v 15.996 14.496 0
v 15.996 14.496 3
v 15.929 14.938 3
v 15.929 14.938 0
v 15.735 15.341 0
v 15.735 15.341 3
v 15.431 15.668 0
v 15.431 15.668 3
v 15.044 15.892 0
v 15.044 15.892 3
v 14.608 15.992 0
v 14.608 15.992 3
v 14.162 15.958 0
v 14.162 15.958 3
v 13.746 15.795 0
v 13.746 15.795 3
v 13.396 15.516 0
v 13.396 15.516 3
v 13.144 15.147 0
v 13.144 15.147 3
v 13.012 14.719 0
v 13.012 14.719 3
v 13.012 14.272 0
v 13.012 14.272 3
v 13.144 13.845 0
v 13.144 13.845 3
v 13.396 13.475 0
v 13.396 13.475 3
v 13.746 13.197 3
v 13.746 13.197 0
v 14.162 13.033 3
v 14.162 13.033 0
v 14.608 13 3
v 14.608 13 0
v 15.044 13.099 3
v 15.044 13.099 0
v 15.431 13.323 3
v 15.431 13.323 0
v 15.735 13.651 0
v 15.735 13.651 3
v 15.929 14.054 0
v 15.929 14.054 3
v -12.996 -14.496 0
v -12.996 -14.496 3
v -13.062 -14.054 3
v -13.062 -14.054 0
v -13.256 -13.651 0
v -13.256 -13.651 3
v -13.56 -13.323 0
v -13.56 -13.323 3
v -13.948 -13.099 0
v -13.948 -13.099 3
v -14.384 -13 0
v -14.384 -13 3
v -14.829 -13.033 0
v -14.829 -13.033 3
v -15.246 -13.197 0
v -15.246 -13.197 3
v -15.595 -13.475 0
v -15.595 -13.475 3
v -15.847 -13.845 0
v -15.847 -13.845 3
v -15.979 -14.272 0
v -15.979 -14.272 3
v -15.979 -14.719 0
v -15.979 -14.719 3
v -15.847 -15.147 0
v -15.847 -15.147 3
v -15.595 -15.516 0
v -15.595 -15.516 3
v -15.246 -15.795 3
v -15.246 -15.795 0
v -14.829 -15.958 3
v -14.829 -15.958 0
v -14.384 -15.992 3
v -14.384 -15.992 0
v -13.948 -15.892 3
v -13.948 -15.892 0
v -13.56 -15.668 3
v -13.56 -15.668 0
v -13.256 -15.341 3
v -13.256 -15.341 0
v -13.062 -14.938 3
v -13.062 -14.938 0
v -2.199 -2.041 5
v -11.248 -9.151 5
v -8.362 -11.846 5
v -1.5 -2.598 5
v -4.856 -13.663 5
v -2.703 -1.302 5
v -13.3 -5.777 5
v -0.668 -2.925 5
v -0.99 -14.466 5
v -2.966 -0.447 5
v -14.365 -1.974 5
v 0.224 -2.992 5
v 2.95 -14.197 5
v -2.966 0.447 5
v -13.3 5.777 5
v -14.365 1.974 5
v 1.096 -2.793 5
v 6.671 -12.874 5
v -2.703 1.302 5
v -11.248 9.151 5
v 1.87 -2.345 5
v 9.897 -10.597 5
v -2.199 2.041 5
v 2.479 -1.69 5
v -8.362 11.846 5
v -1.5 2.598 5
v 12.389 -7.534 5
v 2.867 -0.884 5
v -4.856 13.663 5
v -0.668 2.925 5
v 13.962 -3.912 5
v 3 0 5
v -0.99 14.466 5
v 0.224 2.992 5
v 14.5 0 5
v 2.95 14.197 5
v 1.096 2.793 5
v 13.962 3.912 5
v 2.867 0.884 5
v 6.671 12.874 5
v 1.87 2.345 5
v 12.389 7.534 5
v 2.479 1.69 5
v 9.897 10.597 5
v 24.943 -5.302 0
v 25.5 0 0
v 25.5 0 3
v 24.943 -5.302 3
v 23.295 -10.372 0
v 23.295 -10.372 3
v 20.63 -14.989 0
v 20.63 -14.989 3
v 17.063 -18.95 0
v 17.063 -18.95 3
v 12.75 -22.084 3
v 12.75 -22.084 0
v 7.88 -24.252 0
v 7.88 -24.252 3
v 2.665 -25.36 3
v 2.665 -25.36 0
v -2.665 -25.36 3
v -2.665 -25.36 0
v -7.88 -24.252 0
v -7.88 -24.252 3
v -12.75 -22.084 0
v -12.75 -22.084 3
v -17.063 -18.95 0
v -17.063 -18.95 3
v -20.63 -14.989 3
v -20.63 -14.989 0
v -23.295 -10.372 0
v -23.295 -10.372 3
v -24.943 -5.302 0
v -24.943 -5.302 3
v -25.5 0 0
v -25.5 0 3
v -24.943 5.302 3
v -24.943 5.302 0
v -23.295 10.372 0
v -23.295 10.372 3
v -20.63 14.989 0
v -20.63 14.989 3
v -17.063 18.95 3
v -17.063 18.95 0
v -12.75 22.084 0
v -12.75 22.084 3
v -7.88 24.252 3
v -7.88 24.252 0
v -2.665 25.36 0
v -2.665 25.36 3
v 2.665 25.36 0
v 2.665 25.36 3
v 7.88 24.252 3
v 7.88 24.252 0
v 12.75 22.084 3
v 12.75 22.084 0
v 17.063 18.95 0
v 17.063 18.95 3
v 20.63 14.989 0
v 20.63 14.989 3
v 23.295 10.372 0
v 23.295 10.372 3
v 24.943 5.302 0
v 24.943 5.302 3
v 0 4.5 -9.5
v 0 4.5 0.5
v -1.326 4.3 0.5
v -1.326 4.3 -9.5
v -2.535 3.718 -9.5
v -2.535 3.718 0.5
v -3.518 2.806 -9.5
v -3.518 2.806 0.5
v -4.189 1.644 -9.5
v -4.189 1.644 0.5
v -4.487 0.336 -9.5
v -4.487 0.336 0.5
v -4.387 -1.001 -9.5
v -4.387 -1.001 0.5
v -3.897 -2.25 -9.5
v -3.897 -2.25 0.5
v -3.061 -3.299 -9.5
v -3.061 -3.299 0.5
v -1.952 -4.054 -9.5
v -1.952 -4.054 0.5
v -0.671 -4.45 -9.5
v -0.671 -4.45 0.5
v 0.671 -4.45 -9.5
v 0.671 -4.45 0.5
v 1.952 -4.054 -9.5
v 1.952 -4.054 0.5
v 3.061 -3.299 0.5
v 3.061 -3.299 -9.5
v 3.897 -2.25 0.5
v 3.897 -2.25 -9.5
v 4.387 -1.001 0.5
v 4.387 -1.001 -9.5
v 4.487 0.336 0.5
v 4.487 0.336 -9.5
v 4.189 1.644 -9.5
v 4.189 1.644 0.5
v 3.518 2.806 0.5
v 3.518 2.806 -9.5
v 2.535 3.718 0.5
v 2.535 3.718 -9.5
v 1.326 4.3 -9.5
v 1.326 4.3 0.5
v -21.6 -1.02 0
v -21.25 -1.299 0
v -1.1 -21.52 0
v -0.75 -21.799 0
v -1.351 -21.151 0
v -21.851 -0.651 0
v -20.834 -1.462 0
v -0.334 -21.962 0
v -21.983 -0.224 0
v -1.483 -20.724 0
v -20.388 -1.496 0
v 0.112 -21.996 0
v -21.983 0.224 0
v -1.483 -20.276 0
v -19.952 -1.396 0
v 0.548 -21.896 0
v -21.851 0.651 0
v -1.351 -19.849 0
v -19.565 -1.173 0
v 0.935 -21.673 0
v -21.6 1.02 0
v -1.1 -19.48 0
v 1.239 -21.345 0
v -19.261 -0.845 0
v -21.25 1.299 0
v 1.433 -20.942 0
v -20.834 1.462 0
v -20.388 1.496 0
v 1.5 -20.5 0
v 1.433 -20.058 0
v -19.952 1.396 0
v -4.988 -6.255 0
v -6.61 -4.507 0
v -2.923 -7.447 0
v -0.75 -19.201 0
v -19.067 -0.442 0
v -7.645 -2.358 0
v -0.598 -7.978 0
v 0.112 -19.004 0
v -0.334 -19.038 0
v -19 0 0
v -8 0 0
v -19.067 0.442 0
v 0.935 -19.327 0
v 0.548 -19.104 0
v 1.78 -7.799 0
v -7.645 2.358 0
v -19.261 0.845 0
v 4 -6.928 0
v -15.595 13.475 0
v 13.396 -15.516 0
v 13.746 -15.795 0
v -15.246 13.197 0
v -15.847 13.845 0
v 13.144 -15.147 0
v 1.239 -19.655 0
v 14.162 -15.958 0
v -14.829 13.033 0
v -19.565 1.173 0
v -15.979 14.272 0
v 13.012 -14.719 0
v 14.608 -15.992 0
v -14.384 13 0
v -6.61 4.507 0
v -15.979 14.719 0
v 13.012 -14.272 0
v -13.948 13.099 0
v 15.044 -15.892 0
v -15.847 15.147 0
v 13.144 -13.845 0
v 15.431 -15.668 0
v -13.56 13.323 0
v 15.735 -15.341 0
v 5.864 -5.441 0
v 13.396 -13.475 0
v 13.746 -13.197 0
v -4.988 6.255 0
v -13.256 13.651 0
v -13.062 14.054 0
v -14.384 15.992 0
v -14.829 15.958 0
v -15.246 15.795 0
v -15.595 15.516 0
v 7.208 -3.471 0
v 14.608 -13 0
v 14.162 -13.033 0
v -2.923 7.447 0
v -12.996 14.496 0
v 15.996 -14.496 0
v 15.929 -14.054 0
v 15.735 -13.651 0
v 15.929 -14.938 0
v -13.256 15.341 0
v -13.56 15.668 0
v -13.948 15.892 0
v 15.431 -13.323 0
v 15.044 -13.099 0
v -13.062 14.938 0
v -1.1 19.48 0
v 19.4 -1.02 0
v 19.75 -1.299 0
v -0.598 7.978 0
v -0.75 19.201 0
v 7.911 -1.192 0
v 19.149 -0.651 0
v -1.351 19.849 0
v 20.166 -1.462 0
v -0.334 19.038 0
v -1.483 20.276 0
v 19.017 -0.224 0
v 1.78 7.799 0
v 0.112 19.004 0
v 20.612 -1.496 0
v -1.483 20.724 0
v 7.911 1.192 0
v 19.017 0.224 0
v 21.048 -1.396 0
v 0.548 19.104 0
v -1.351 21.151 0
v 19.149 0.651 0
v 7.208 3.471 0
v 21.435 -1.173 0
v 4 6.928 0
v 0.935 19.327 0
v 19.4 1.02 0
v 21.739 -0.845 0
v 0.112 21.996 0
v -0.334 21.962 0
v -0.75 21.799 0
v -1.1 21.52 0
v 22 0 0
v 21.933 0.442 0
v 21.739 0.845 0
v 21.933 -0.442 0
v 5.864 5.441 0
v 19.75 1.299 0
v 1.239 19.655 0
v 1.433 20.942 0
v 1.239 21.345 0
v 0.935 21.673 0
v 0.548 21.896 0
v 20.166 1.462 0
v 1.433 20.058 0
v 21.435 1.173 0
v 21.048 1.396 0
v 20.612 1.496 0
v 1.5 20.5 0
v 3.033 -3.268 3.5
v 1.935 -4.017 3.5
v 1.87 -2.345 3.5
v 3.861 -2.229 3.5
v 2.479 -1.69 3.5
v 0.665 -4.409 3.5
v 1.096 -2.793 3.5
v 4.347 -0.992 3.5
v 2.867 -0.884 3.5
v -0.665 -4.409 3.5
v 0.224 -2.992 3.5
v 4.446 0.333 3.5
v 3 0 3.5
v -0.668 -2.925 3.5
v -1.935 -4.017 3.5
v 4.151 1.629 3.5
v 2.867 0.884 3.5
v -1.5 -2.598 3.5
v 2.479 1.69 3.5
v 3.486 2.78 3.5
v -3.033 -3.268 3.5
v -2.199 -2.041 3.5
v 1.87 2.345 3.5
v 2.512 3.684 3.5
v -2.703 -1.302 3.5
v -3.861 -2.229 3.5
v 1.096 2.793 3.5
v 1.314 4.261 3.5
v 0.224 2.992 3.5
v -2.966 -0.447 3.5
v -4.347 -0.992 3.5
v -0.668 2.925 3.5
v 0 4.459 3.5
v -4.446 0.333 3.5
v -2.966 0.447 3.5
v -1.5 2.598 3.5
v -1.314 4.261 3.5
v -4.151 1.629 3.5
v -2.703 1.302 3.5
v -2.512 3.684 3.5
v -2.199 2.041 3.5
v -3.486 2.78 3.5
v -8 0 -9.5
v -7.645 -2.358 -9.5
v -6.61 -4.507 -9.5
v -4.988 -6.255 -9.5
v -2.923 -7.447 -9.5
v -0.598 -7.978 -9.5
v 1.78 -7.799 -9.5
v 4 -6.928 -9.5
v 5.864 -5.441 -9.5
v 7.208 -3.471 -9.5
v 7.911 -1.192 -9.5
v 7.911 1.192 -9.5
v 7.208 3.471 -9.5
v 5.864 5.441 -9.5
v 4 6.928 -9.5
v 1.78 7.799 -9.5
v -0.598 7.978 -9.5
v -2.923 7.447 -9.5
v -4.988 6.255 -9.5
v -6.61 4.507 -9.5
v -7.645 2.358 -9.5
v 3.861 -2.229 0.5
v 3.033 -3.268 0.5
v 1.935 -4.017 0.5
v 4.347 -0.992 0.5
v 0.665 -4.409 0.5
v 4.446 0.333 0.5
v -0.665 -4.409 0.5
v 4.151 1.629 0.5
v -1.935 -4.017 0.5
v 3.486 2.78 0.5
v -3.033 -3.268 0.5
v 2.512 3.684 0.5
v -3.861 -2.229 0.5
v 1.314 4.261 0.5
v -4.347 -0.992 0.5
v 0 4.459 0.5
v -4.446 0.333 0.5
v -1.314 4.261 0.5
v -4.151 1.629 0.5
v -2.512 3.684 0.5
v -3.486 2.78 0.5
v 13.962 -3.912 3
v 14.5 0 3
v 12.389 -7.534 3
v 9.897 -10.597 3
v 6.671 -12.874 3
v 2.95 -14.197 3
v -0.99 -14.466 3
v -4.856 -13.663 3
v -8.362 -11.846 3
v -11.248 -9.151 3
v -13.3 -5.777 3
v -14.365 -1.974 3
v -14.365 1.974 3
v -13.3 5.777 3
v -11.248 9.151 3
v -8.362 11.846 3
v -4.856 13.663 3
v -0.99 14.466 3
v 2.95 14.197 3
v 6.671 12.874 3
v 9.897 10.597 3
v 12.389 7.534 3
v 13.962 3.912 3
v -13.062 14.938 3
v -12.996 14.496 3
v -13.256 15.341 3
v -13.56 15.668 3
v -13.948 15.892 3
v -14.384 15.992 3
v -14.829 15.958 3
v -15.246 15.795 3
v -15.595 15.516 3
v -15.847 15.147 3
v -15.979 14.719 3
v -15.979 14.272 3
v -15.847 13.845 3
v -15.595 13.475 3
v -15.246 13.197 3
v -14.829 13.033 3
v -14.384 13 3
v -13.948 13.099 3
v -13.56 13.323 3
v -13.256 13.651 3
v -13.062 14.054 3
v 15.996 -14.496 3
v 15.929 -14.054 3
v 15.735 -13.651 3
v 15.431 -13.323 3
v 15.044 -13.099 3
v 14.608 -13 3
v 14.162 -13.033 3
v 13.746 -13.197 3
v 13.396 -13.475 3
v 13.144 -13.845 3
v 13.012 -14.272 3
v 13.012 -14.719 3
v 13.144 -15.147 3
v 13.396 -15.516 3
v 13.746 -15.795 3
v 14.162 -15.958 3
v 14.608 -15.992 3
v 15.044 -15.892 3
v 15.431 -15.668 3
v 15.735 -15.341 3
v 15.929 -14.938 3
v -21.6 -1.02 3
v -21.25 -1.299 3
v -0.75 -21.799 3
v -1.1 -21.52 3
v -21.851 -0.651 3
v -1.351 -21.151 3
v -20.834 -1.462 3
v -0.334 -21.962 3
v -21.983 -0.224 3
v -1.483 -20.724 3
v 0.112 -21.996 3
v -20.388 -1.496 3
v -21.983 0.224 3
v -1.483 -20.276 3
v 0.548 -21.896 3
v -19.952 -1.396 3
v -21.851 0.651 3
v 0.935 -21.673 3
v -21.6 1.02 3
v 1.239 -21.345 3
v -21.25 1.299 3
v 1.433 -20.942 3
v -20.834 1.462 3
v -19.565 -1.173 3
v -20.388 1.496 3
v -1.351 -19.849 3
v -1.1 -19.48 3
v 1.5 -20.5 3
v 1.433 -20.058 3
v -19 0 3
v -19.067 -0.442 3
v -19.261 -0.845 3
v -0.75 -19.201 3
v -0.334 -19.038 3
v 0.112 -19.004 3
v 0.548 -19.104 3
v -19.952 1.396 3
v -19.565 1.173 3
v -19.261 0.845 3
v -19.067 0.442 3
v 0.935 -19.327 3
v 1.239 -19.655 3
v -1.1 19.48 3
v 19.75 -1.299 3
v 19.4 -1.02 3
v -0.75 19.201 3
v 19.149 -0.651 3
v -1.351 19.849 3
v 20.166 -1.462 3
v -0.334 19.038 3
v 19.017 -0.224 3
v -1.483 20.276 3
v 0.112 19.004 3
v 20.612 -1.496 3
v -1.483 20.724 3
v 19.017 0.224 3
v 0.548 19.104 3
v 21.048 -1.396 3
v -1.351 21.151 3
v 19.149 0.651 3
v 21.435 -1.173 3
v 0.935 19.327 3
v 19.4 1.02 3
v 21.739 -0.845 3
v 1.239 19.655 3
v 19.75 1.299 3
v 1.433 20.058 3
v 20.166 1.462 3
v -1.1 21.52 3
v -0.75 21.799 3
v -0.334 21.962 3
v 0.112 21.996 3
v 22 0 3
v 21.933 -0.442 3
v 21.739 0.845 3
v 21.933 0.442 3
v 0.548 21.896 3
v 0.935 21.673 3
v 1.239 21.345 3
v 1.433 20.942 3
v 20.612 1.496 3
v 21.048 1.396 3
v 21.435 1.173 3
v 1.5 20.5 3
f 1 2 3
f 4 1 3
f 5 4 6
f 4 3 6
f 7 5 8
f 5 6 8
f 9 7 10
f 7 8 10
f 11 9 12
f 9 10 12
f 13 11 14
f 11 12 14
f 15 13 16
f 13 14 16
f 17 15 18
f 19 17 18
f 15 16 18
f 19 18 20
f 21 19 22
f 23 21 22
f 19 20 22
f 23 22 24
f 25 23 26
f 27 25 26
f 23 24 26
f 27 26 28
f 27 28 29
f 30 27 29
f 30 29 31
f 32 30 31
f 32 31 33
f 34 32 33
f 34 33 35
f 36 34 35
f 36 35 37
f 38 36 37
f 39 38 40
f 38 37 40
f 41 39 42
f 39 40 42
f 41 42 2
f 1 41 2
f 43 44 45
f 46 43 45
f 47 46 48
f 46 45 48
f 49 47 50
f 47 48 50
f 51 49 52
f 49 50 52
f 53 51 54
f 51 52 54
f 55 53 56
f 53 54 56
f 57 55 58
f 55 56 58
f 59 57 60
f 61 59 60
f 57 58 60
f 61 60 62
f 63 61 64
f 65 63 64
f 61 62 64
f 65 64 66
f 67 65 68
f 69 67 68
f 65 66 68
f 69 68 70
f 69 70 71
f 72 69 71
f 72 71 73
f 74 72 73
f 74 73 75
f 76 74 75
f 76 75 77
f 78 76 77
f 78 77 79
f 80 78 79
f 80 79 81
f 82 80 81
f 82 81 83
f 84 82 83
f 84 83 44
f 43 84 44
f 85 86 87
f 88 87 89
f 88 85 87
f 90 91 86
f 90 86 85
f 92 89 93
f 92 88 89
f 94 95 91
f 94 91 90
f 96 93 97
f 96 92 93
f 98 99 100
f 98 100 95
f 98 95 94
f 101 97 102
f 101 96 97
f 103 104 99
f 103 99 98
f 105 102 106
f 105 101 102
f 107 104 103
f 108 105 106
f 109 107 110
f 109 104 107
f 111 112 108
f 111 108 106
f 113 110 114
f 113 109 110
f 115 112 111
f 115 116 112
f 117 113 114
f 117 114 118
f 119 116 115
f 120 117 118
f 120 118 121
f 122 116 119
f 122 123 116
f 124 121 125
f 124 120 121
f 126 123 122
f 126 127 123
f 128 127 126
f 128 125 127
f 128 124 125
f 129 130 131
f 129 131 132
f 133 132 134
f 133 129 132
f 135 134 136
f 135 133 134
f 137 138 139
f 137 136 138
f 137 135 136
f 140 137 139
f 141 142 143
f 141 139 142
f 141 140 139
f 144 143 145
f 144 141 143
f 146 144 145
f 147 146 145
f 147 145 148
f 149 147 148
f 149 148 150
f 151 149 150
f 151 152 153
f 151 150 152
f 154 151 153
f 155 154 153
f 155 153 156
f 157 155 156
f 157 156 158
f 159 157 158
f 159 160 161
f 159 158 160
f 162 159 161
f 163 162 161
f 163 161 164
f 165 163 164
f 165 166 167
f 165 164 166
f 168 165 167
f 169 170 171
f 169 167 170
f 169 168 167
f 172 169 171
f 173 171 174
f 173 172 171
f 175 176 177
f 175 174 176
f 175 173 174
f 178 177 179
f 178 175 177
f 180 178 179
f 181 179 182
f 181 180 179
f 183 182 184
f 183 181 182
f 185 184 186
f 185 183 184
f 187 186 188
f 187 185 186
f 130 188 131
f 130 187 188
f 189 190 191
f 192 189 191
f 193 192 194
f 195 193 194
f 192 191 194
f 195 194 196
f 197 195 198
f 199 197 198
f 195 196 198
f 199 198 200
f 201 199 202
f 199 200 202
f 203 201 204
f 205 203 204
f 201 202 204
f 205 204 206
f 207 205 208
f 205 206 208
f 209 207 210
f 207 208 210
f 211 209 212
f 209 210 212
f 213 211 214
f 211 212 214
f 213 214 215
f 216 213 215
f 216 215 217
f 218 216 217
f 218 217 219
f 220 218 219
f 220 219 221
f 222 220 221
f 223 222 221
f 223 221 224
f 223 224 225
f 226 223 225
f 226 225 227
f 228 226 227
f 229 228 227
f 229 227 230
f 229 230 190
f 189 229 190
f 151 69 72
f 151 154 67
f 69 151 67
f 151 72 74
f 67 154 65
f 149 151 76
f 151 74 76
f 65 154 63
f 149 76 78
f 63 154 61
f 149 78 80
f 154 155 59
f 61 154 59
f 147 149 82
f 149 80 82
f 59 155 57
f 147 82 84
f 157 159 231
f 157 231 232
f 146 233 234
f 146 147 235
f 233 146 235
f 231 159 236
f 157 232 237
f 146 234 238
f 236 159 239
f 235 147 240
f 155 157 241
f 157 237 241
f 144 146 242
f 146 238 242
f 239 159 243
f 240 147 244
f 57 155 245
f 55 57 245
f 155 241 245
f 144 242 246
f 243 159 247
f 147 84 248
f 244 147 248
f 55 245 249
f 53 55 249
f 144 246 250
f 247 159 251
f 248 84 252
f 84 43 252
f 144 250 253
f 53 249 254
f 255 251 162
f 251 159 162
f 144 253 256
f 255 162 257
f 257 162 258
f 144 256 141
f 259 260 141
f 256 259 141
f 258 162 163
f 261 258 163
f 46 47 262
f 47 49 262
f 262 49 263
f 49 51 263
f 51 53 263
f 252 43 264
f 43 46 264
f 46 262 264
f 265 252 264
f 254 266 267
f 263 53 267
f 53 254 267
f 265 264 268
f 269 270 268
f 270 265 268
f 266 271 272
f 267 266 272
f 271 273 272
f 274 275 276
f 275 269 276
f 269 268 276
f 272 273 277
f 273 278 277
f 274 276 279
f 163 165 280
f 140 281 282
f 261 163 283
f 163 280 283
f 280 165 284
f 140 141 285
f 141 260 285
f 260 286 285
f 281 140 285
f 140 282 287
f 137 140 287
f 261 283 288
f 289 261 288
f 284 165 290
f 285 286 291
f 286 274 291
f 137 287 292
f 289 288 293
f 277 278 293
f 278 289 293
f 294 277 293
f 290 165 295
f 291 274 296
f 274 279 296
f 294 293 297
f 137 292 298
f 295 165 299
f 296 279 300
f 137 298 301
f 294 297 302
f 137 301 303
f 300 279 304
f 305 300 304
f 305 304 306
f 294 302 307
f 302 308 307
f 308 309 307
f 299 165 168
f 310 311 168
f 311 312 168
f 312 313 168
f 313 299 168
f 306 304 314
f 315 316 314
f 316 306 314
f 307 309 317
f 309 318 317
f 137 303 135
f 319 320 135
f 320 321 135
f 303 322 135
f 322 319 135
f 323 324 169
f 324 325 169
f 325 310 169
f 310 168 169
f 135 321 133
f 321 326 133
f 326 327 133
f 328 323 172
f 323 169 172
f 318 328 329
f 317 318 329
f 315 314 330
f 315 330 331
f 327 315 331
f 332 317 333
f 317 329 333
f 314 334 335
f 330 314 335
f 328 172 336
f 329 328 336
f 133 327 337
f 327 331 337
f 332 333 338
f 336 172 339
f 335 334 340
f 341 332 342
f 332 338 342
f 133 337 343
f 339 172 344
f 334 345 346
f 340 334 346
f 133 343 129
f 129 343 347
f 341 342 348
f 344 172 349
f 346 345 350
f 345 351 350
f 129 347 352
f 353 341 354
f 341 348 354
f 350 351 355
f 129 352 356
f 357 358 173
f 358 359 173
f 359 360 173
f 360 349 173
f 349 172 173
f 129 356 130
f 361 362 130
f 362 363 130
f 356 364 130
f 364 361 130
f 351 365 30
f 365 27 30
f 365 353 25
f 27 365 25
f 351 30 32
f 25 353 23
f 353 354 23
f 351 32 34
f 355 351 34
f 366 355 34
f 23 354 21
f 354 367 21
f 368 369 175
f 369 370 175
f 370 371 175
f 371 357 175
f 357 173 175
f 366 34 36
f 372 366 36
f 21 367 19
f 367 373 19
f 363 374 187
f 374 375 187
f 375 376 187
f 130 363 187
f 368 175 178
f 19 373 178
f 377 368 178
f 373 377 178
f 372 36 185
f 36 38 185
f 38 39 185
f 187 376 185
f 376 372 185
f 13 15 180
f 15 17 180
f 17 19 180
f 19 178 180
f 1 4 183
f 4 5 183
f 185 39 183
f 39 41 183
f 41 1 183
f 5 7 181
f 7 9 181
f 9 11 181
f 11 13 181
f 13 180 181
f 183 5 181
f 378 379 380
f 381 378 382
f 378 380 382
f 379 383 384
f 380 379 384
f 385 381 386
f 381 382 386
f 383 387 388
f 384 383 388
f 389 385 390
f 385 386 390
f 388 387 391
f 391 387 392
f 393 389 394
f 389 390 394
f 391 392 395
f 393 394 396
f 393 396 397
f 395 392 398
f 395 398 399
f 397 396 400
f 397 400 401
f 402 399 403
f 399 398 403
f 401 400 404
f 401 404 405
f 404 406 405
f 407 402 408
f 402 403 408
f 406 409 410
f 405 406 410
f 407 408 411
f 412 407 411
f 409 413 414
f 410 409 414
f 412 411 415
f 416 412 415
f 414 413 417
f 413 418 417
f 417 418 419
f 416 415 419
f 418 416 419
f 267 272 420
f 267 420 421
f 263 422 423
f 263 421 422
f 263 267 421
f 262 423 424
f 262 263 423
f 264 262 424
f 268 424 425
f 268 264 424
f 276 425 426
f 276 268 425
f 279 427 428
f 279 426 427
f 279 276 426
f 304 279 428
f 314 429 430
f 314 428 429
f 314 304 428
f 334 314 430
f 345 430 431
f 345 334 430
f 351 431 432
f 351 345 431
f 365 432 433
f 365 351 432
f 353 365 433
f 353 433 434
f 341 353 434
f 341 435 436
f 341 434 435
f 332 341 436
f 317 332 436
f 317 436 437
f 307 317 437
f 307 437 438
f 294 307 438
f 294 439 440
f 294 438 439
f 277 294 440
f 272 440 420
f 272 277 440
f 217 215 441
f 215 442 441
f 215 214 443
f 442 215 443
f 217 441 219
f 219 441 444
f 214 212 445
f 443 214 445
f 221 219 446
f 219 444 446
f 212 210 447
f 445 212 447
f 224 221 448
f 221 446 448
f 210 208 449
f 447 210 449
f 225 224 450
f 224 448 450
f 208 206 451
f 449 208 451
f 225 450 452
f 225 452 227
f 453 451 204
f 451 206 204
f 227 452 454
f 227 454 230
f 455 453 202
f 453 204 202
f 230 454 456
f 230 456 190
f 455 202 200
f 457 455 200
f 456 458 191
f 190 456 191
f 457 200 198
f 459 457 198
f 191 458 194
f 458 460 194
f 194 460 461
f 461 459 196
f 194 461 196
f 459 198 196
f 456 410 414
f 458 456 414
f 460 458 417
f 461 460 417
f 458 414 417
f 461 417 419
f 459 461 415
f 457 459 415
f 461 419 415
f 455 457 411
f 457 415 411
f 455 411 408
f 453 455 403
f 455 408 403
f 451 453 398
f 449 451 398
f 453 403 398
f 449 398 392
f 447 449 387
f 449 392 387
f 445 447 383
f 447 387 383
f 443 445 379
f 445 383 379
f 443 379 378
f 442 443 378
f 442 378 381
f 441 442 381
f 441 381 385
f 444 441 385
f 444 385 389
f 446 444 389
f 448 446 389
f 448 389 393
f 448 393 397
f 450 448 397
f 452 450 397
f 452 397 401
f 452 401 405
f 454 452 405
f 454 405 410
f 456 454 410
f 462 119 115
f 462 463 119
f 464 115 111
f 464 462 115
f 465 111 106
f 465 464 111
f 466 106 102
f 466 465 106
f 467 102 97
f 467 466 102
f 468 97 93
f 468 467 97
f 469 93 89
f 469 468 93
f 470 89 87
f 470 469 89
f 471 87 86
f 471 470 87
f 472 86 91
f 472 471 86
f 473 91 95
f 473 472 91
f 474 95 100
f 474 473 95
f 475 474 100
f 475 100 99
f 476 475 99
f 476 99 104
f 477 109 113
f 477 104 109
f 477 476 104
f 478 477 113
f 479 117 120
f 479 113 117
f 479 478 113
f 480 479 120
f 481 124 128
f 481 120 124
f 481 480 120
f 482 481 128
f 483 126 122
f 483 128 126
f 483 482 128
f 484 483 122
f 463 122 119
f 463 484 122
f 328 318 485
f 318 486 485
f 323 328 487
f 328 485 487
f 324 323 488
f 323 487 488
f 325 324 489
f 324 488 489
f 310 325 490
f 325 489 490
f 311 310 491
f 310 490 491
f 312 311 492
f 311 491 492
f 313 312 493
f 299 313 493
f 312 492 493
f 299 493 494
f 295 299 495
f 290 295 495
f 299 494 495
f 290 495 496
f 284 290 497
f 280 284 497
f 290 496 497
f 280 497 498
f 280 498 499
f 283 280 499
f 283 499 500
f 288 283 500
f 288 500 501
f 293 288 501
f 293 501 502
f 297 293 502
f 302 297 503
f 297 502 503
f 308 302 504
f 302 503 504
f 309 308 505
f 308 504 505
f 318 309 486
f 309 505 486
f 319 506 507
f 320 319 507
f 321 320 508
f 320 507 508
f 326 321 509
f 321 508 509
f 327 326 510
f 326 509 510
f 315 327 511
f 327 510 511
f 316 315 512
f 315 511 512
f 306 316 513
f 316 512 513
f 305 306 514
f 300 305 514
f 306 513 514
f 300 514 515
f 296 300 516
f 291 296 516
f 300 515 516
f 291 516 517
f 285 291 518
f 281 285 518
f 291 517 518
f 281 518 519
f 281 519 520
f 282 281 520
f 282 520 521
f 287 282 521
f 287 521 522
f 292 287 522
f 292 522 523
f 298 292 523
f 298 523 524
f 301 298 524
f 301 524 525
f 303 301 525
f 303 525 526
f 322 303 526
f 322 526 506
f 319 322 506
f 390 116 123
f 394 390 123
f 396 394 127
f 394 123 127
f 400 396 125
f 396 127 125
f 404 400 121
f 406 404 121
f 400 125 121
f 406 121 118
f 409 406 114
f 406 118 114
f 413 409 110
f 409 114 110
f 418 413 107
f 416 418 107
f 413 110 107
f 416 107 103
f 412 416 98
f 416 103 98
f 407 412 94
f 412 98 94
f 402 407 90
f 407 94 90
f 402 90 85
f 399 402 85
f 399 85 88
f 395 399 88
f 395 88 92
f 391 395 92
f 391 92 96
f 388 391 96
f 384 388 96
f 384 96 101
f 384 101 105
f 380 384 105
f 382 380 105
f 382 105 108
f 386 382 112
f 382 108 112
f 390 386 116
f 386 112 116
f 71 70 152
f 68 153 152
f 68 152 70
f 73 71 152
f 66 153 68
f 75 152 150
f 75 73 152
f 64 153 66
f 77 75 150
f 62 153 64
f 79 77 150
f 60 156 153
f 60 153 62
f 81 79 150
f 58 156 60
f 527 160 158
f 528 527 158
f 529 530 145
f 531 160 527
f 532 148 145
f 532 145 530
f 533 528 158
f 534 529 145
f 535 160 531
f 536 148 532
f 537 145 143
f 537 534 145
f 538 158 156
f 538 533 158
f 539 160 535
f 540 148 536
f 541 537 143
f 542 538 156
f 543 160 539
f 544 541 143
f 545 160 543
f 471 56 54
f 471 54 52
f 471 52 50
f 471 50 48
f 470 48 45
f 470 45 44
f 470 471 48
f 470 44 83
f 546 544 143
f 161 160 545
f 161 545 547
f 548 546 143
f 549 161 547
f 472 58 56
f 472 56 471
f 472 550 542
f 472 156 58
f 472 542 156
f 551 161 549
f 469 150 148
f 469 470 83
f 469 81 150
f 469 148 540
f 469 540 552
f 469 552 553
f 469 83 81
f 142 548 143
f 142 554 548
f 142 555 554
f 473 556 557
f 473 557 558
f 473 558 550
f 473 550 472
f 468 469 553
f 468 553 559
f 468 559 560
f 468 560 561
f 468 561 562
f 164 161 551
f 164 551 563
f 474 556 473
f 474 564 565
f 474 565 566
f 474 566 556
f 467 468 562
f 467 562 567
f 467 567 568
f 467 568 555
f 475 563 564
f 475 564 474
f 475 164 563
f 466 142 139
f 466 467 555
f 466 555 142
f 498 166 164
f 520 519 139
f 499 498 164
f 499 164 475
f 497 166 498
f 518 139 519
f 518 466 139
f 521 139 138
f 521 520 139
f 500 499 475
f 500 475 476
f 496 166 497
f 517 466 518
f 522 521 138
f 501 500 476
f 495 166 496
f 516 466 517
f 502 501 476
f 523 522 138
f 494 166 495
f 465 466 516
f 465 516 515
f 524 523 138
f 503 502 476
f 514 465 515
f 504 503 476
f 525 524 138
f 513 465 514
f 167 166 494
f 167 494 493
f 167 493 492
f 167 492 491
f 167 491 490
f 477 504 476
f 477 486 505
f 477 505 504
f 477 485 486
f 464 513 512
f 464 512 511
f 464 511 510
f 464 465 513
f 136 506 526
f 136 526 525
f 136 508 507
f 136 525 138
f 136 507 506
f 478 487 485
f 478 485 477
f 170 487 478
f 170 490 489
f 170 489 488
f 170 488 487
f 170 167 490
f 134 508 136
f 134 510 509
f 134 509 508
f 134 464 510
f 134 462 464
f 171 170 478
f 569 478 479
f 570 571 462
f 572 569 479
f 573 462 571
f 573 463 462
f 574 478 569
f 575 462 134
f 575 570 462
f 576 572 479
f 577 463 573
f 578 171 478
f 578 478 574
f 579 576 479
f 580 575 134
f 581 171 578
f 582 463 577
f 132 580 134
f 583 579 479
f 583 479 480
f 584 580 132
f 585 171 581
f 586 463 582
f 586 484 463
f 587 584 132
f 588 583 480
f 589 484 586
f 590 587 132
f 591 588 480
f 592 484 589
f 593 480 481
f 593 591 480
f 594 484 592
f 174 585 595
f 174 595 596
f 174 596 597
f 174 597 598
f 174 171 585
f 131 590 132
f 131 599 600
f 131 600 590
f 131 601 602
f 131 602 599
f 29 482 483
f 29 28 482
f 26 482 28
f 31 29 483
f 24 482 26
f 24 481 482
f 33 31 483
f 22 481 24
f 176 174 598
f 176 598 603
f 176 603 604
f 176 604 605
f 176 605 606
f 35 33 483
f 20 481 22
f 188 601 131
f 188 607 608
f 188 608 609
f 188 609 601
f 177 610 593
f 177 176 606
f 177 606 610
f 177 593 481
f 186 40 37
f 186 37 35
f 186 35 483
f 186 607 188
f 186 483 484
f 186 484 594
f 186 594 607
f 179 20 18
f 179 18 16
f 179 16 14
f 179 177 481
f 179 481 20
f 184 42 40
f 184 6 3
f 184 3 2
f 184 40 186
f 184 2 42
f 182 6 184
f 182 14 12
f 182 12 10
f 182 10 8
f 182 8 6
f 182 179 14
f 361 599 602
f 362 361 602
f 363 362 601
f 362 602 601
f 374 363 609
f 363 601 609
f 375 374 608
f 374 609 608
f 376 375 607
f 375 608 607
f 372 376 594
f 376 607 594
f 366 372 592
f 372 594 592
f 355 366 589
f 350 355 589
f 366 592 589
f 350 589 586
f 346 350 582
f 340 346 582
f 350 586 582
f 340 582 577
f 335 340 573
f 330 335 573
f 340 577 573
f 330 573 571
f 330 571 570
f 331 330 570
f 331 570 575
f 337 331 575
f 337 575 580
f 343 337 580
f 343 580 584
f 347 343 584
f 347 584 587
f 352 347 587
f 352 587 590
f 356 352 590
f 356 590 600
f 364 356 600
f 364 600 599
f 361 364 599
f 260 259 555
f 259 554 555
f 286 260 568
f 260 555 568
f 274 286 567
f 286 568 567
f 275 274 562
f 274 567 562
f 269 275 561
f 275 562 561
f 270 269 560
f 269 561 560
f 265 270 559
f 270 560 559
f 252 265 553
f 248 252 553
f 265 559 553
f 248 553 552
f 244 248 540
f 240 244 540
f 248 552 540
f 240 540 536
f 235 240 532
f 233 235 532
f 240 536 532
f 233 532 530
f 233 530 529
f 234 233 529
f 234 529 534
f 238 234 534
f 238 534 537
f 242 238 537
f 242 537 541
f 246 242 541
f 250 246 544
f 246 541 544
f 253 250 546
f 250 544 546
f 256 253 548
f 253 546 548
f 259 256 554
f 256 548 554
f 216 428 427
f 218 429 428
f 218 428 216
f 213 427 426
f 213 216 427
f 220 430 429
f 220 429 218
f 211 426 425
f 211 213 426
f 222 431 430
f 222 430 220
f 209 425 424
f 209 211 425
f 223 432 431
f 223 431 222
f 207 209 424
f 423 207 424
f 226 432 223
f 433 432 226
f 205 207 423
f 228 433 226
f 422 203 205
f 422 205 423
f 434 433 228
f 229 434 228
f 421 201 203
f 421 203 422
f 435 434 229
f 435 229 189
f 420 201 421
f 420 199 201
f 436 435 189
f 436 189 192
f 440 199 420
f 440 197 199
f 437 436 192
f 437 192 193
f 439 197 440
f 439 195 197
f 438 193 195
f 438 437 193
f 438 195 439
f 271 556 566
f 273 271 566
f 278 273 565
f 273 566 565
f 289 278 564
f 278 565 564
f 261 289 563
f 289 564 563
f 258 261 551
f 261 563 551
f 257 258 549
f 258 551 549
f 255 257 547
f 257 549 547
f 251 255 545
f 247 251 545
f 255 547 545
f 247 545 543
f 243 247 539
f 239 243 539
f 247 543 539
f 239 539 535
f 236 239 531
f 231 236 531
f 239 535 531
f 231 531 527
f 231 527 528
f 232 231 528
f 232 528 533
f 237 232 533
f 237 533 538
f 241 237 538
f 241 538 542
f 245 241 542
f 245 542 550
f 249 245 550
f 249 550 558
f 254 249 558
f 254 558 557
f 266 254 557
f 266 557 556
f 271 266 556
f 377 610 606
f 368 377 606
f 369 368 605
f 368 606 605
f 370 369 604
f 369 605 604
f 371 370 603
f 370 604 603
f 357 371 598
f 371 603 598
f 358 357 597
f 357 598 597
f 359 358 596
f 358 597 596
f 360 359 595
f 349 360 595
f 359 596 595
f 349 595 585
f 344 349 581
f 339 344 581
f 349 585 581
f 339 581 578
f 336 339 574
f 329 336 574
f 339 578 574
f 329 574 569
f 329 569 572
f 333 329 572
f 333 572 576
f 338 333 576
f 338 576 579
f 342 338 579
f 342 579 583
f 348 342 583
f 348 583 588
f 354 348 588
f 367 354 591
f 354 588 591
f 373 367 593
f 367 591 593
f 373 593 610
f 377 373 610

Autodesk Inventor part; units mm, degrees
ref_plane "YZ Plane" through (0, 0, 0) normal (1, 0, 0) x (0, 1, 0)
ref_plane "XZ Plane" through (0, 0, 0) normal (0, 1, 0) x (-1, 0, 0)
ref_plane "XY Plane" through (0, 0, 0) normal (0, 0, 1) x (1, 0, 0)
sketch "Sketch1" plane through (0, 0, 0) normal (0, 0, 1) x (1, 0, 0)
  circle A0 centre (0, 0) radius 25.5
  dimension "d0" = 51
extrude "Extrusion1" add sketch "Sketch1" along normal blind 3
sketch "Sketch2" plane through (0, 0, 3) normal (0, 0, 1) x (1, 0, 0)
  circle A0 centre (0, 0) radius 25.5 projected
  circle A1 centre (0, 0) radius 14.5
  dimension "d3" = 29
extrude "Extrusion2" add sketch "Sketch2" along normal blind 2 contours A1
sketch "Sketch3" plane through (0, 0, 0) normal (0, 0, -1) x (-1, 0, 0)
  circle A0 centre (0, 0) radius 25.5 projected
  circle A1 centre (0, 0) radius 8
  dimension "d6" = 16
extrude "Extrusion3" add sketch "Sketch3" along normal blind 9.5 contours A1
sketch "Sketch4" plane through (0, 0, 5) normal (0, 0, 1) x (1, 0, 0)
  circle A0 centre (0, 0) radius 14.5 projected
  circle A1 centre (0, 0) radius 3
  dimension "d9" = 6
extrude "Extrusion4" cut sketch "Sketch4" against normal through all contours A1
sketch "Sketch5" plane through (0, 0, 3) normal (0, 0, 1) x (1, 0, 0)
  circle A0 centre (0, 0) radius 25.5 projected
  circle A1 centre (0, 0) radius 20.5
  circle A2 centre (0, 20.5) radius 1.5
  circle A3 centre (-14.4957, 14.4957) radius 1.5
  circle A4 centre (-20.5, 0) radius 1.5
  circle A5 centre (-14.4957, -14.4957) radius 1.5
  circle A6 centre (0, -20.5) radius 1.5
  circle A7 centre (14.4957, -14.4957) radius 1.5
  circle A8 centre (20.5, 0) radius 1.5
  circle A9 centre (14.4957, 14.4957) radius 1.5
  dimension "d12" = 41
  dimension "d13" = 3
  dimension "d16" = 360
extrude "Extrusion5" cut sketch "Sketch5" against normal through all contours A1 A8 | A1 A8 | A9 A1 | A1 A9 | A7 A1 | A1 A7 | A2 A1 | A1 A2 | A6 A1 | A1 A6 | A3 A1 | A1 A3 | A5 A1 | A1 A5 | A4 A1 | A1 A4
sketch "Sketch6" plane through (0, 0, -9.5) normal (0, 0, -1) x (-1, 0, 0)
  circle A0 centre (0, 0) radius 3 projected
hole "Hole1" at (0, 0, -9.5) direction (0, 0, 1) diameter 8.9175 depth 13 counterbore diameter 9 counterbore depth 10 thread size "M10x1" class "6H" standard "ANSI Metric M Profile"
properties part number "08 CYLINDER REAR COVER" material "Steel AISI 1020 107 HR"
